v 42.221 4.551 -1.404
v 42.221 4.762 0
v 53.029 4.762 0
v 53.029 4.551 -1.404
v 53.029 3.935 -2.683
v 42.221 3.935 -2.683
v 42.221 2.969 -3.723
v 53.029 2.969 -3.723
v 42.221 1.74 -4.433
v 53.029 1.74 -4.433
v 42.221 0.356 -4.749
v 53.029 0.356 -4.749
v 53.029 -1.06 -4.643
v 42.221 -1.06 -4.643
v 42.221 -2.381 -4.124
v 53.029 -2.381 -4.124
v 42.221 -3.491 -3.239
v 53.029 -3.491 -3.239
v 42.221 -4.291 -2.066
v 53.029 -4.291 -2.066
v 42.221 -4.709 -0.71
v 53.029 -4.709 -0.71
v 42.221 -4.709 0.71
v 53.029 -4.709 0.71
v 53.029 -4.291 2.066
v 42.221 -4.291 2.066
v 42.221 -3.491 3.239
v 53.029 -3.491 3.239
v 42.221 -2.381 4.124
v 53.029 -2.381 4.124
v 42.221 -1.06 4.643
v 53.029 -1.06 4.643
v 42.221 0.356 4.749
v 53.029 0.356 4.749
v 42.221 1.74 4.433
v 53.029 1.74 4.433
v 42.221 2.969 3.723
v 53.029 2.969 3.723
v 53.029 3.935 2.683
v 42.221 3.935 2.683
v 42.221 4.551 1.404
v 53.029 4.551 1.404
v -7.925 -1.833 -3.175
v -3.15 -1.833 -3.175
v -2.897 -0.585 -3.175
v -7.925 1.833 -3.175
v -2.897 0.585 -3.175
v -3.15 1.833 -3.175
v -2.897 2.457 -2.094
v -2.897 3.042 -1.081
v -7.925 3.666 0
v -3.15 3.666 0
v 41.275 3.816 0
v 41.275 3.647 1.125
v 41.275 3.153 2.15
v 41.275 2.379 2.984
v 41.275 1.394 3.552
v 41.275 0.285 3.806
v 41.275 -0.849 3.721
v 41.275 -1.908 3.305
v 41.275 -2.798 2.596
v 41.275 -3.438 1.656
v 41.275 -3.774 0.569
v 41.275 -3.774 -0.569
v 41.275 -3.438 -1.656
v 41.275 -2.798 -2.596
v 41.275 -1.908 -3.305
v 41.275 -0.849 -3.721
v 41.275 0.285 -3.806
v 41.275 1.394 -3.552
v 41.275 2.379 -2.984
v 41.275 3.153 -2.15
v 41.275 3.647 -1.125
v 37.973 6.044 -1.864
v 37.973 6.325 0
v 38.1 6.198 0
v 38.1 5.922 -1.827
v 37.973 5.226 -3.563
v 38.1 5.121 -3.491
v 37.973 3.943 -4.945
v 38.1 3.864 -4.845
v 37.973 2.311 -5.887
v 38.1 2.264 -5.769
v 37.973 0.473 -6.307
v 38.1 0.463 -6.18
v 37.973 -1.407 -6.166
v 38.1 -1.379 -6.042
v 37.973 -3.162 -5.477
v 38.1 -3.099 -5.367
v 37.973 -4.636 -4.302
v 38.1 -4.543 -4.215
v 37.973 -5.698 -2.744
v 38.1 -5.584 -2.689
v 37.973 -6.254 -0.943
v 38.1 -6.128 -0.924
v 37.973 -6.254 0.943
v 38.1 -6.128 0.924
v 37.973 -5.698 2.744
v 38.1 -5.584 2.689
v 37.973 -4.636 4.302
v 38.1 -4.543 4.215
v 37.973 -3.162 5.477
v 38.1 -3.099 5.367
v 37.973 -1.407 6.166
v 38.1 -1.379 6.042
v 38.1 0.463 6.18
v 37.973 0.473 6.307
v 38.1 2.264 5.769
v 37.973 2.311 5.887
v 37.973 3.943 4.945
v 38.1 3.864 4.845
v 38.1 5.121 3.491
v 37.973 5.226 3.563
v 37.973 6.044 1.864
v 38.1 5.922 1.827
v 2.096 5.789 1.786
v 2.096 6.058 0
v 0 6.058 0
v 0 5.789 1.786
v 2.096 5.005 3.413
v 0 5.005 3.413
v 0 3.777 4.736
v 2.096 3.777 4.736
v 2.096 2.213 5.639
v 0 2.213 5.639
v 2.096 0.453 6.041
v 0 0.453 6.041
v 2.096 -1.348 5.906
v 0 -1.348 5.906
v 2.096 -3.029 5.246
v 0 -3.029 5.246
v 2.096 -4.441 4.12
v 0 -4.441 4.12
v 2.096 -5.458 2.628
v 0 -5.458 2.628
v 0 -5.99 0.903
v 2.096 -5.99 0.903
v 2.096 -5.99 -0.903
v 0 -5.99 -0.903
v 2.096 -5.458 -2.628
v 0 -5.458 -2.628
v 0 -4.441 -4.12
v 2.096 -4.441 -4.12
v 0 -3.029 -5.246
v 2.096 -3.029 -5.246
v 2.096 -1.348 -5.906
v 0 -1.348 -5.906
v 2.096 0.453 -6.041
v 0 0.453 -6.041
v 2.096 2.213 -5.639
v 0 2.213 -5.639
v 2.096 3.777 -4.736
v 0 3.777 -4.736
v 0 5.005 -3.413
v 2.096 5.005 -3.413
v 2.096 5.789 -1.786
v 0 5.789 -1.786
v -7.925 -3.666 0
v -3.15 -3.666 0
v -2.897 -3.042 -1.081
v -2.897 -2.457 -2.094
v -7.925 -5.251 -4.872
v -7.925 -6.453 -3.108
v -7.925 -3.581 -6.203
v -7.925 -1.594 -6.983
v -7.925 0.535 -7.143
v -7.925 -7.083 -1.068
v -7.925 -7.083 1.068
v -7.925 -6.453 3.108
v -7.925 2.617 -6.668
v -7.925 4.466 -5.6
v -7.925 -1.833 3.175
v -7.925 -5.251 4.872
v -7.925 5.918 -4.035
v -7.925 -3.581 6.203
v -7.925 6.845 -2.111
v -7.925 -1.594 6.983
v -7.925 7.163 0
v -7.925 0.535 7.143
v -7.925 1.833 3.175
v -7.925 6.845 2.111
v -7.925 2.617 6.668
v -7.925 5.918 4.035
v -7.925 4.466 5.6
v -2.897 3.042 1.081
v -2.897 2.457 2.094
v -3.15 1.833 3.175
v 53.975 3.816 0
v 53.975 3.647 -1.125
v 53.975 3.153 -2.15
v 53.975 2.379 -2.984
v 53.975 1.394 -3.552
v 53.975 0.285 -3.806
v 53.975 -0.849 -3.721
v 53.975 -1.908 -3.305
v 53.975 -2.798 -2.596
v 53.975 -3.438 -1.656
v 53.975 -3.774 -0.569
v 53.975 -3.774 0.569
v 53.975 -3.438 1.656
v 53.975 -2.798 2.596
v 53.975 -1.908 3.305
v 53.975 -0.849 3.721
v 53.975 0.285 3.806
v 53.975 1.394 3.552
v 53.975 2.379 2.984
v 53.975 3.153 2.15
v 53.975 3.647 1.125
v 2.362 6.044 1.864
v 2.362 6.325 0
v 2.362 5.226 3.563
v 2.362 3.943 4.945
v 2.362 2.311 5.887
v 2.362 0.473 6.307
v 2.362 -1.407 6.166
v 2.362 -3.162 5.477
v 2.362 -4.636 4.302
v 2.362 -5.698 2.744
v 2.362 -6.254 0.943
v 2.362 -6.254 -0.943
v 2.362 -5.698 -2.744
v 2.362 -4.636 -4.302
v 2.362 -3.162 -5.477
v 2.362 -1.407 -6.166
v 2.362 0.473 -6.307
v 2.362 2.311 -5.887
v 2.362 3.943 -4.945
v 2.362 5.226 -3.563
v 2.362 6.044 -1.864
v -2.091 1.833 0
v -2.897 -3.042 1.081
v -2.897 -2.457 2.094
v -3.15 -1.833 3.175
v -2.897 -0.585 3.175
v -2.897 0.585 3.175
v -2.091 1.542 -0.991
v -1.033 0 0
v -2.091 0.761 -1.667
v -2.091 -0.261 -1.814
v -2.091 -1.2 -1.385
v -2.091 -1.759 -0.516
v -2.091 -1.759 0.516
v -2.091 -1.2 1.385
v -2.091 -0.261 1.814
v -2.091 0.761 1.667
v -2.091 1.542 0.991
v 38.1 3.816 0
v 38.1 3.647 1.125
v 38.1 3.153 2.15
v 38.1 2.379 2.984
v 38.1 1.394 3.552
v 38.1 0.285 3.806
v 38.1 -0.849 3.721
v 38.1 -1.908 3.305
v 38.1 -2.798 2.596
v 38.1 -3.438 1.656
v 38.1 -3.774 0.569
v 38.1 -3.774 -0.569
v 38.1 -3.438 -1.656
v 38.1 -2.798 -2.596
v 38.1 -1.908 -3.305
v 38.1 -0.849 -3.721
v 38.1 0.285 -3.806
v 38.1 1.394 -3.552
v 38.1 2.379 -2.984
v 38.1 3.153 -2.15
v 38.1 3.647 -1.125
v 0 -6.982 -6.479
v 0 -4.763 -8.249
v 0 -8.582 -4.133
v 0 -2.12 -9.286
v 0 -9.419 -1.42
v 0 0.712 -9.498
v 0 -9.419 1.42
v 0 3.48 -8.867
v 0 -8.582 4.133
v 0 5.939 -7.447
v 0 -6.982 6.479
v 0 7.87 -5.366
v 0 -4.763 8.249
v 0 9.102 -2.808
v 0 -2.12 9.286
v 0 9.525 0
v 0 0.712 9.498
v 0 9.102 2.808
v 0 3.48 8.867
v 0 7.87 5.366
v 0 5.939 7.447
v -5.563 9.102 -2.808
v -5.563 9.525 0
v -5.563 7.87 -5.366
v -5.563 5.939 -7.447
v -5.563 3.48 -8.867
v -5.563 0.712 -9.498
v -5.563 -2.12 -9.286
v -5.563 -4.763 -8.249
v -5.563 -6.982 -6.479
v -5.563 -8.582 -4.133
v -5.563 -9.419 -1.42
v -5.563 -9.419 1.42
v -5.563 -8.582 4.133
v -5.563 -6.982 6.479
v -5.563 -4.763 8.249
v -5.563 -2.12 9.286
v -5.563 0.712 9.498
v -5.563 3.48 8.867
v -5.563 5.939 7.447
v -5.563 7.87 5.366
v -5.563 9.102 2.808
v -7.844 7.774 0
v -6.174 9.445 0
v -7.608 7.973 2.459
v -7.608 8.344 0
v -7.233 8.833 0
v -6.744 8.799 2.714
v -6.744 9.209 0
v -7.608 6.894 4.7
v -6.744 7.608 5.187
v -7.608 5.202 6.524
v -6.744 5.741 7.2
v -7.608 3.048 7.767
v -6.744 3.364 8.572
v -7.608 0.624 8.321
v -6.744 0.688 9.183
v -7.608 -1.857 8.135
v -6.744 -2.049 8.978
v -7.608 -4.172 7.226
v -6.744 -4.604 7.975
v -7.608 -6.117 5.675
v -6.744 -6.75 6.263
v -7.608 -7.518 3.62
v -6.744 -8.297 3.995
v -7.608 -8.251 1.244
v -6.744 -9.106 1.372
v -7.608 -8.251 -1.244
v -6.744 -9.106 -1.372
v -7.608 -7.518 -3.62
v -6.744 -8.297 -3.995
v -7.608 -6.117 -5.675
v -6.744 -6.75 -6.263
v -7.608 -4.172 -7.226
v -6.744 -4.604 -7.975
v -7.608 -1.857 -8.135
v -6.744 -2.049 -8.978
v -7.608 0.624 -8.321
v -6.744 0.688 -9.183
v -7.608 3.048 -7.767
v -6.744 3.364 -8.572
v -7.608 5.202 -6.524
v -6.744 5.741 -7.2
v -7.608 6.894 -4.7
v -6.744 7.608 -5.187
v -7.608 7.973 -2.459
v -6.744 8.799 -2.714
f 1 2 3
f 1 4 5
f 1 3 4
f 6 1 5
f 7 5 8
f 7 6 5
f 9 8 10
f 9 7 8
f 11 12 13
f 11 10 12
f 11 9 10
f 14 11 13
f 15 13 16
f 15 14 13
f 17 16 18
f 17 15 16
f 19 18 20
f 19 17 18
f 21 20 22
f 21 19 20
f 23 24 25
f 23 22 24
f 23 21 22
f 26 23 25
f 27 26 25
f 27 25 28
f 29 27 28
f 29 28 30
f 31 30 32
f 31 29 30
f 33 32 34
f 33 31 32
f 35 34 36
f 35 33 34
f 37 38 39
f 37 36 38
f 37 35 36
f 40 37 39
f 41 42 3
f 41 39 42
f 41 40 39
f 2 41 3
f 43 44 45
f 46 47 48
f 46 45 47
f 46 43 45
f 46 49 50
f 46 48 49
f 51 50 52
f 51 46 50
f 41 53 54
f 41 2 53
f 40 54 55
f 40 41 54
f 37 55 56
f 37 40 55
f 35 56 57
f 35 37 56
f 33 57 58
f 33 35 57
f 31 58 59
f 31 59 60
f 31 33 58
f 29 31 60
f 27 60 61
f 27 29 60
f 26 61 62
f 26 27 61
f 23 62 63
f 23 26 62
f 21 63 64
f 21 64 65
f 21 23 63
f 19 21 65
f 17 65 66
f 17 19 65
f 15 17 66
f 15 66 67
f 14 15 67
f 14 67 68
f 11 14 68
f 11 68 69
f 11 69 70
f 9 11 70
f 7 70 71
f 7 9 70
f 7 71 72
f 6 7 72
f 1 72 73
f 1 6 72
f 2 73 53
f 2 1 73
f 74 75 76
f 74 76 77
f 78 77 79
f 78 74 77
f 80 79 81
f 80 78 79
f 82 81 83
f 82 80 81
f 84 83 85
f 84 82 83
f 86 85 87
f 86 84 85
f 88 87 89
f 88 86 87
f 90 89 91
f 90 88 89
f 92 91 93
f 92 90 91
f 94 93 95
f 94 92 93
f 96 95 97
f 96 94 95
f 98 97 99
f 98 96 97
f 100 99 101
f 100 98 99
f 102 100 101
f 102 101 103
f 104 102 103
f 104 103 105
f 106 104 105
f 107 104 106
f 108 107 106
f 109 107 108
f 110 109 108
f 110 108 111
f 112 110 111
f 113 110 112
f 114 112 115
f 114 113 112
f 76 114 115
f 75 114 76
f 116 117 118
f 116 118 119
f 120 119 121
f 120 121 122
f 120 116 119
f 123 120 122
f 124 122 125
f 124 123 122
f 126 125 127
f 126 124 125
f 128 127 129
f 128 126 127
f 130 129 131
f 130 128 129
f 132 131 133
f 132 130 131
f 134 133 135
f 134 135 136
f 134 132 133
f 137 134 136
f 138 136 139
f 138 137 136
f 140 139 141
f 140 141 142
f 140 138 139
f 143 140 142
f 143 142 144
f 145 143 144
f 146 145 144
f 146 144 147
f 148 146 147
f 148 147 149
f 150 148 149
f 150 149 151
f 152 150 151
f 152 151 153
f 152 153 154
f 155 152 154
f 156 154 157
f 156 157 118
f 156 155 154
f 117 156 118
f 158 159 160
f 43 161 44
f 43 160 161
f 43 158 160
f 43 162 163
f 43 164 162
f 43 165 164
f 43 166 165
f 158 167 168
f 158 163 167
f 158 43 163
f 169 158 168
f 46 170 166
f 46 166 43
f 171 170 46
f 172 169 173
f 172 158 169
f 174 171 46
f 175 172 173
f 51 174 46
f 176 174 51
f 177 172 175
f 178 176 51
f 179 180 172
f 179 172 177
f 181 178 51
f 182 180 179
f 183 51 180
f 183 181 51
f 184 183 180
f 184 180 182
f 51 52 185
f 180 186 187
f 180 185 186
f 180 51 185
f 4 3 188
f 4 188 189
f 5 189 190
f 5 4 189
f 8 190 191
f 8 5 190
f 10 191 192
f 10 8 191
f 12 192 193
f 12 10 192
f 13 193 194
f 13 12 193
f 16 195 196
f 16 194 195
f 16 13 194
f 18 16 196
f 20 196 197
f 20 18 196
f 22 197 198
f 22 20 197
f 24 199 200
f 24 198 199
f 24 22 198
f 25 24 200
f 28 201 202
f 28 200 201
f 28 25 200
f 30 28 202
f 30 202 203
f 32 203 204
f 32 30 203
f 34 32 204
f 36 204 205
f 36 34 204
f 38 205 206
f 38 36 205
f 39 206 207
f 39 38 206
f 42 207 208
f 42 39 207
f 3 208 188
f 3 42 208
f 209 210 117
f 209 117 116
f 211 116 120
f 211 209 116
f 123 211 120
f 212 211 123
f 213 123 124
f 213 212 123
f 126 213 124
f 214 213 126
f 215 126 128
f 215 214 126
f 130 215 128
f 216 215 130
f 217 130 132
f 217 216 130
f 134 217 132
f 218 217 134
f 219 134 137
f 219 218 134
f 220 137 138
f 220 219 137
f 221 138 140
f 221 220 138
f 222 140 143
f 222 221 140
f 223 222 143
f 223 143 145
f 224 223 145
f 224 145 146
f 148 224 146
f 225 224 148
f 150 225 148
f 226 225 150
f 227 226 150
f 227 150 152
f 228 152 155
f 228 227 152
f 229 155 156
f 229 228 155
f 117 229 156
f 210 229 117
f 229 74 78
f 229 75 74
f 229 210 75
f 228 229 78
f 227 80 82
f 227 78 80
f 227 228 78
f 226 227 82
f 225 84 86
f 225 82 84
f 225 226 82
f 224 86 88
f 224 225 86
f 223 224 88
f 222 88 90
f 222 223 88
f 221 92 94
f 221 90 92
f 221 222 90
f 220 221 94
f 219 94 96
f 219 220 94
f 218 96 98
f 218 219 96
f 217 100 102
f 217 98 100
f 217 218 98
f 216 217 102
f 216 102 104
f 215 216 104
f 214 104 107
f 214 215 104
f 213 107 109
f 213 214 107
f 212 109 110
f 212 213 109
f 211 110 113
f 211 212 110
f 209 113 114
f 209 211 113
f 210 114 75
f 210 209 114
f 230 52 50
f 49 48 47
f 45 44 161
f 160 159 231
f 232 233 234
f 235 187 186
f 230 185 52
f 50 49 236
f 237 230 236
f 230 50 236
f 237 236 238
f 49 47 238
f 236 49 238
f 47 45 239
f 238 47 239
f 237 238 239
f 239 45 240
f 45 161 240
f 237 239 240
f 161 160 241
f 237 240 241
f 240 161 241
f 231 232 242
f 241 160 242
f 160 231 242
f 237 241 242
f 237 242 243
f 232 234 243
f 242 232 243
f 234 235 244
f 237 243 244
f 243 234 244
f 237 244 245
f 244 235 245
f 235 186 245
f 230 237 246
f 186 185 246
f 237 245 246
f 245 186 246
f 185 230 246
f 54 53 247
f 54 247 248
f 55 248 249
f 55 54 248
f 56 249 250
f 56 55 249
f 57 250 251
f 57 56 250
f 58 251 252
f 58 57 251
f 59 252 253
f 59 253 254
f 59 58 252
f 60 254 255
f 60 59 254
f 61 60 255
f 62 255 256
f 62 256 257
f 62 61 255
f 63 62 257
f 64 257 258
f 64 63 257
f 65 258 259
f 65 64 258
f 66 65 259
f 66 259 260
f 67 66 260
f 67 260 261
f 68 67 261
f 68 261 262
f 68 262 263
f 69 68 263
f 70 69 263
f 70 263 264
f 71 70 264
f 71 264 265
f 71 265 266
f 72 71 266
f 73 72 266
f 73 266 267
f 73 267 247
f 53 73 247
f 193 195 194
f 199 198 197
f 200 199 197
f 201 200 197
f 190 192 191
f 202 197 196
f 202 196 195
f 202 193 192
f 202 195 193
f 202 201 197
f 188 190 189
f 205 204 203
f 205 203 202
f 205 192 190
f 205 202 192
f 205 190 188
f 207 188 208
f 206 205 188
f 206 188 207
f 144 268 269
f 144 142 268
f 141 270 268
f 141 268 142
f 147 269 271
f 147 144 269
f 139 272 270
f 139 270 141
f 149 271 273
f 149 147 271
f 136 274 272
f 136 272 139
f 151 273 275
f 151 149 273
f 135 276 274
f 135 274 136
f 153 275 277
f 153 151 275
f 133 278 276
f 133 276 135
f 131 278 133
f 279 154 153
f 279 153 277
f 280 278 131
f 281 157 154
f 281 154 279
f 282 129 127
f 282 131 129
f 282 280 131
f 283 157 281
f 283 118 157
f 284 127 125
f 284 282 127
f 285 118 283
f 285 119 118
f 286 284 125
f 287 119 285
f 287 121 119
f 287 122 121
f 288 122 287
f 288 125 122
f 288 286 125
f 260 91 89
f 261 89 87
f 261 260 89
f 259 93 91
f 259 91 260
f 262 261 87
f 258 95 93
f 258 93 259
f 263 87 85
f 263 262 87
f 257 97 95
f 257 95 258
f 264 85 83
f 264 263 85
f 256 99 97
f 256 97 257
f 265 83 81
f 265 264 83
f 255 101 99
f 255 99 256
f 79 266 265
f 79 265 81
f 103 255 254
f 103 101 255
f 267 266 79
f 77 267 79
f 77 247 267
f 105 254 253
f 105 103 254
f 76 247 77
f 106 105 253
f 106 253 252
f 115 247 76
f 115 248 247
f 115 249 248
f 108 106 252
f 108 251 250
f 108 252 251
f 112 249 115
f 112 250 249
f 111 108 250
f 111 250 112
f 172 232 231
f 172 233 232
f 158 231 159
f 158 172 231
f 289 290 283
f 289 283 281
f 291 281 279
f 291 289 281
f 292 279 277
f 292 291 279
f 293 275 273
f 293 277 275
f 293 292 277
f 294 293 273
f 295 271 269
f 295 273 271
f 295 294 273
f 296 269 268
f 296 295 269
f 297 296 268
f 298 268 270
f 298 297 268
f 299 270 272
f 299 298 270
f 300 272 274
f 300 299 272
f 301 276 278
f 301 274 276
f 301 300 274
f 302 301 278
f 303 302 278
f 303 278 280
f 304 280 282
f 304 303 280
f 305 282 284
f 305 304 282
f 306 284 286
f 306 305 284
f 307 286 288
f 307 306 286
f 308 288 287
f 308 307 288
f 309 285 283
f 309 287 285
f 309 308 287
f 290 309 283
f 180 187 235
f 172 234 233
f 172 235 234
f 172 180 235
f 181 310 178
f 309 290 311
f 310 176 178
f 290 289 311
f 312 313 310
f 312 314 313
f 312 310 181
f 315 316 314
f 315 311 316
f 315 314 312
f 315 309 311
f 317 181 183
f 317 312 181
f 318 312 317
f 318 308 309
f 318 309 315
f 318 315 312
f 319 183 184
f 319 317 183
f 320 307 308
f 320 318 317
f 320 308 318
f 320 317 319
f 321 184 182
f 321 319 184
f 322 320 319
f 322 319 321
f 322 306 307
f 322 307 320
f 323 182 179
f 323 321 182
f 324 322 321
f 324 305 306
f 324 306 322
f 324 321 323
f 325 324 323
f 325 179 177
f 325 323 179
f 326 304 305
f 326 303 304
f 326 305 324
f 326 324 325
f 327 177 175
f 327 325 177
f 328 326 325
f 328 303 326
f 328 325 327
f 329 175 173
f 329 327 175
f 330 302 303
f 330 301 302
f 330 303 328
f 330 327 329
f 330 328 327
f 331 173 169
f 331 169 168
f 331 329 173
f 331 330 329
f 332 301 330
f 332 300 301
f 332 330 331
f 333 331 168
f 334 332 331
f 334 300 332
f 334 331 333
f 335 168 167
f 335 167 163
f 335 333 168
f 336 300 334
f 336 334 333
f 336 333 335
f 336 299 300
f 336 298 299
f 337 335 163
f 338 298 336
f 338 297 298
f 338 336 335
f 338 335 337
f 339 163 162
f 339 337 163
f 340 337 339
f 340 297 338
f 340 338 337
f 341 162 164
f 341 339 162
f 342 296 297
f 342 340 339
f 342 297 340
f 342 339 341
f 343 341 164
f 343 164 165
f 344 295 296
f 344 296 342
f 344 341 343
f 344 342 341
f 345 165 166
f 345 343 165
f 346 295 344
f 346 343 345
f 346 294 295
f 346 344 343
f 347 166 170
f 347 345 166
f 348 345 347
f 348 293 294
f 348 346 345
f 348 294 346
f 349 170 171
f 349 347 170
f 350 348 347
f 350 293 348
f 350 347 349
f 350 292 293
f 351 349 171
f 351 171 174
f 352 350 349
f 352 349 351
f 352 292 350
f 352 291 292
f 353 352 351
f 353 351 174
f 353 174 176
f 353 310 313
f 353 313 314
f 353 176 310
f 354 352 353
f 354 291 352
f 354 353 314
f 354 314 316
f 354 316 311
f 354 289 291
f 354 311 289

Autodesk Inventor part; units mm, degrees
ref_plane "YZ Plane" through (0, 0, 0) normal (1, 0, 0) x (0, 1, 0)
ref_plane "XZ Plane" through (0, 0, 0) normal (0, 1, 0) x (-1, 0, 0)
ref_plane "XY Plane" through (0, 0, 0) normal (0, 0, 1) x (1, 0, 0)
sketch "Sketch1" plane through (0, 0, 0) normal (0, 0, 1) x (1, 0, 0)
  line L0 (-1.0329, 0) -> (53.975, 0)
  line L1 (53.975, 0) -> (53.975, 4.7625)
  line L2 (53.975, 4.7625) -> (38.1, 4.7625)
  line L3 (38.1, 4.7625) -> (38.1, 6.3246)
  line L4 (38.1, 6.3246) -> (0, 6.3246)
  line L5 (0, 6.3246) -> (0, 9.525)
  line L6 (0, 9.525) -> (-7.9248, 9.525)
  line L7 (-7.9248, 9.525) -> (-7.9248, 3.6662)
  line L8 (-7.9248, 3.6662) -> (-3.1496, 3.6662)
  line L9 (-3.1496, 3.6662) -> (-1.0329, 0)
  line L10 (-20.3048, 0) -> (66.355, 0) projected
  line L11 (0, -1.905) -> (0, 11.43) projected
  line L12 (0, 6.0579) -> (2.0955, 6.0579)
  line L13 (2.0955, 6.0579) -> (2.3622, 6.3246)
  line L14 (38.1, 4.7625) -> (38.1, 3.8163)
  line L15 (38.1, 3.8163) -> (41.275, 3.8163)
  line L16 (41.275, 3.8163) -> (42.2212, 4.7625)
  line L17 (0, 6.0579) -> (0, 6.3246)
  dimension "d0" = 9.525
  dimension "d1" = 12.6492
  dimension "d2" = 19.05
  dimension "d3" = 7.3323
  dimension "d5" = 15.875
  dimension "d6" = 7.9248
  dimension "d7" = 4.7752
  dimension "d8" = 60
  dimension "d9" = 53.975
  dimension "d19" = 45
  dimension "d20" = 12.1158
  dimension "d21" = 7.6327
  dimension "d22" = 45
  dimension "d23" = 3.175
  dimension "d34" = 2.3622
revolve "Body" add sketch "Sketch1" angle 360 about axis through (-1.0329, 0, 0) along (1, 0, 0)
sketch "Sketch2" plane through (-7.9248, 0, 0) normal (-1, 0, 0) x (0, 0, 1)
  circle A0 centre (0, 0) radius 3.6662 projected
  line L0 (0, 3.6662) -> (3.175, 1.8331)
  line L1 (3.175, 1.8331) -> (3.175, -1.8331)
  line L2 (3.175, -1.8331) -> (0, -3.6662)
  line L3 (0, -3.6662) -> (-3.175, -1.8331)
  line L4 (-3.175, -1.8331) -> (-3.175, 1.8331)
  line L5 (-3.175, 1.8331) -> (0, 3.6662)
extrude "Slot" add sketch "Sketch2" against normal up to next contours A0 L1 | L0 A0 | A0 L2 | L5 A0 | A0 L3 | L4 A0
fillet "Fillet1" radius 2.3622 1 edges at (-7.9248, -9.525, 0)
thread "Thread" size "3/8-16 UNC" class "2A" standard "ANSI Unified Screw Threads" length 15.875
chamfer "Chamfer1" distance 0.9462 distance2 0.9461 1 edges at (53.975, -4.7625, 0) measured on face at (53.975, 0.1637, 0.4316)
chamfer "Chamfer2" distance 0.127 angle 45 1 edges at (38.1, -6.3246, 0) measured on face at (38.1, 5.6965, -0.8844)
revolve "Groove1" cut sketch "Sketch1" angle 360 about axis through (-1.0329, 0, 0) along (1, 0, 0) contours L11 L4 L13 L12
revolve "Groove2" cut sketch "Sketch1" angle 360 about axis through (-1.0329, 0, 0) along (1, 0, 0) contours L16 L15 L14 L2
equation "\"d0\" = NND"
equation "\"d1\" = BDM"
equation "\"d2\" = KOD"
equation "\"d3\" = 1.1547 * SW"
equation "\"d5\" = GEL"
equation "\"d6\" = KOH"
equation "\"d7\" = INTI + LOTI"
equation "\"d8\" = 0.5 * ANG"
equation "\"d9\" = NLG"
equation "\"d19\" = FAWI4"
equation "\"d20\" = BDMM"
equation "\"d21\" = GD1"
equation "\"d22\" = FAWI2"
equation "\"d23\" = GAL"
equation "\"d34\" = GAL2"
equation "\"d13\" = RR"
equation "\"d25\" = GEL"
equation "\"d14\" = -0.5 * SPD + 0.5 * NND"
equation "\"d15\" = GUL"
equation "\"d32\" = -0.5 * NND + 0.5 * BDM"
equation "\"NND\" = 9.525"
equation "\"NLG\" = 53.975"
equation "\"GEL\" = 15.875"
equation "\"KOD\" = 19.05"
equation "\"KOH\" = 7.9248"
equation "\"INTI\" = 4.7752"
equation "\"GAL\" = 3.175"
equation "\"GUL\" = 0.94615"
equation "\"SPD\" = GD1"
equation "\"BDM\" = 12.6492"
equation "\"ANG\" = 120deg"
equation "\"FAWI2\" = 45deg"
equation "\"FAWI3\" = 45deg"
equation "\"FAWI4\" = 45deg"
equation "\"RR\" = 2.3622"
equation "\"SW\" = 6.35"
equation "\"BDMM\" = 12.1158"
equation "\"GAL2\" = RR"
equation "\"LOTI\" = 0"
equation "\"GD1\" = 7.6327"
equation "\"BOR\" = SW"
equation "\"SLG\" = 38.1"
equation "\"THREADDIA\" = 9.525"
equation "\"E0\" = 1.155 * SW"
equation "\"FAWI1\" = 45deg"
equation "\"TOA\" = 30deg"
equation "\"PHH\" = RR"
equation "\"HHPTC\" = 1.5875"
equation "\"GD0\" = 7.3914"
equation "\"KOH1\" = 6.6548"
equation "\"BDMN\" = 12.7"
properties part number "ANSI B18.3 - 0.500 x 1.5 ANSI B18.3" material "Steel, Mild"
